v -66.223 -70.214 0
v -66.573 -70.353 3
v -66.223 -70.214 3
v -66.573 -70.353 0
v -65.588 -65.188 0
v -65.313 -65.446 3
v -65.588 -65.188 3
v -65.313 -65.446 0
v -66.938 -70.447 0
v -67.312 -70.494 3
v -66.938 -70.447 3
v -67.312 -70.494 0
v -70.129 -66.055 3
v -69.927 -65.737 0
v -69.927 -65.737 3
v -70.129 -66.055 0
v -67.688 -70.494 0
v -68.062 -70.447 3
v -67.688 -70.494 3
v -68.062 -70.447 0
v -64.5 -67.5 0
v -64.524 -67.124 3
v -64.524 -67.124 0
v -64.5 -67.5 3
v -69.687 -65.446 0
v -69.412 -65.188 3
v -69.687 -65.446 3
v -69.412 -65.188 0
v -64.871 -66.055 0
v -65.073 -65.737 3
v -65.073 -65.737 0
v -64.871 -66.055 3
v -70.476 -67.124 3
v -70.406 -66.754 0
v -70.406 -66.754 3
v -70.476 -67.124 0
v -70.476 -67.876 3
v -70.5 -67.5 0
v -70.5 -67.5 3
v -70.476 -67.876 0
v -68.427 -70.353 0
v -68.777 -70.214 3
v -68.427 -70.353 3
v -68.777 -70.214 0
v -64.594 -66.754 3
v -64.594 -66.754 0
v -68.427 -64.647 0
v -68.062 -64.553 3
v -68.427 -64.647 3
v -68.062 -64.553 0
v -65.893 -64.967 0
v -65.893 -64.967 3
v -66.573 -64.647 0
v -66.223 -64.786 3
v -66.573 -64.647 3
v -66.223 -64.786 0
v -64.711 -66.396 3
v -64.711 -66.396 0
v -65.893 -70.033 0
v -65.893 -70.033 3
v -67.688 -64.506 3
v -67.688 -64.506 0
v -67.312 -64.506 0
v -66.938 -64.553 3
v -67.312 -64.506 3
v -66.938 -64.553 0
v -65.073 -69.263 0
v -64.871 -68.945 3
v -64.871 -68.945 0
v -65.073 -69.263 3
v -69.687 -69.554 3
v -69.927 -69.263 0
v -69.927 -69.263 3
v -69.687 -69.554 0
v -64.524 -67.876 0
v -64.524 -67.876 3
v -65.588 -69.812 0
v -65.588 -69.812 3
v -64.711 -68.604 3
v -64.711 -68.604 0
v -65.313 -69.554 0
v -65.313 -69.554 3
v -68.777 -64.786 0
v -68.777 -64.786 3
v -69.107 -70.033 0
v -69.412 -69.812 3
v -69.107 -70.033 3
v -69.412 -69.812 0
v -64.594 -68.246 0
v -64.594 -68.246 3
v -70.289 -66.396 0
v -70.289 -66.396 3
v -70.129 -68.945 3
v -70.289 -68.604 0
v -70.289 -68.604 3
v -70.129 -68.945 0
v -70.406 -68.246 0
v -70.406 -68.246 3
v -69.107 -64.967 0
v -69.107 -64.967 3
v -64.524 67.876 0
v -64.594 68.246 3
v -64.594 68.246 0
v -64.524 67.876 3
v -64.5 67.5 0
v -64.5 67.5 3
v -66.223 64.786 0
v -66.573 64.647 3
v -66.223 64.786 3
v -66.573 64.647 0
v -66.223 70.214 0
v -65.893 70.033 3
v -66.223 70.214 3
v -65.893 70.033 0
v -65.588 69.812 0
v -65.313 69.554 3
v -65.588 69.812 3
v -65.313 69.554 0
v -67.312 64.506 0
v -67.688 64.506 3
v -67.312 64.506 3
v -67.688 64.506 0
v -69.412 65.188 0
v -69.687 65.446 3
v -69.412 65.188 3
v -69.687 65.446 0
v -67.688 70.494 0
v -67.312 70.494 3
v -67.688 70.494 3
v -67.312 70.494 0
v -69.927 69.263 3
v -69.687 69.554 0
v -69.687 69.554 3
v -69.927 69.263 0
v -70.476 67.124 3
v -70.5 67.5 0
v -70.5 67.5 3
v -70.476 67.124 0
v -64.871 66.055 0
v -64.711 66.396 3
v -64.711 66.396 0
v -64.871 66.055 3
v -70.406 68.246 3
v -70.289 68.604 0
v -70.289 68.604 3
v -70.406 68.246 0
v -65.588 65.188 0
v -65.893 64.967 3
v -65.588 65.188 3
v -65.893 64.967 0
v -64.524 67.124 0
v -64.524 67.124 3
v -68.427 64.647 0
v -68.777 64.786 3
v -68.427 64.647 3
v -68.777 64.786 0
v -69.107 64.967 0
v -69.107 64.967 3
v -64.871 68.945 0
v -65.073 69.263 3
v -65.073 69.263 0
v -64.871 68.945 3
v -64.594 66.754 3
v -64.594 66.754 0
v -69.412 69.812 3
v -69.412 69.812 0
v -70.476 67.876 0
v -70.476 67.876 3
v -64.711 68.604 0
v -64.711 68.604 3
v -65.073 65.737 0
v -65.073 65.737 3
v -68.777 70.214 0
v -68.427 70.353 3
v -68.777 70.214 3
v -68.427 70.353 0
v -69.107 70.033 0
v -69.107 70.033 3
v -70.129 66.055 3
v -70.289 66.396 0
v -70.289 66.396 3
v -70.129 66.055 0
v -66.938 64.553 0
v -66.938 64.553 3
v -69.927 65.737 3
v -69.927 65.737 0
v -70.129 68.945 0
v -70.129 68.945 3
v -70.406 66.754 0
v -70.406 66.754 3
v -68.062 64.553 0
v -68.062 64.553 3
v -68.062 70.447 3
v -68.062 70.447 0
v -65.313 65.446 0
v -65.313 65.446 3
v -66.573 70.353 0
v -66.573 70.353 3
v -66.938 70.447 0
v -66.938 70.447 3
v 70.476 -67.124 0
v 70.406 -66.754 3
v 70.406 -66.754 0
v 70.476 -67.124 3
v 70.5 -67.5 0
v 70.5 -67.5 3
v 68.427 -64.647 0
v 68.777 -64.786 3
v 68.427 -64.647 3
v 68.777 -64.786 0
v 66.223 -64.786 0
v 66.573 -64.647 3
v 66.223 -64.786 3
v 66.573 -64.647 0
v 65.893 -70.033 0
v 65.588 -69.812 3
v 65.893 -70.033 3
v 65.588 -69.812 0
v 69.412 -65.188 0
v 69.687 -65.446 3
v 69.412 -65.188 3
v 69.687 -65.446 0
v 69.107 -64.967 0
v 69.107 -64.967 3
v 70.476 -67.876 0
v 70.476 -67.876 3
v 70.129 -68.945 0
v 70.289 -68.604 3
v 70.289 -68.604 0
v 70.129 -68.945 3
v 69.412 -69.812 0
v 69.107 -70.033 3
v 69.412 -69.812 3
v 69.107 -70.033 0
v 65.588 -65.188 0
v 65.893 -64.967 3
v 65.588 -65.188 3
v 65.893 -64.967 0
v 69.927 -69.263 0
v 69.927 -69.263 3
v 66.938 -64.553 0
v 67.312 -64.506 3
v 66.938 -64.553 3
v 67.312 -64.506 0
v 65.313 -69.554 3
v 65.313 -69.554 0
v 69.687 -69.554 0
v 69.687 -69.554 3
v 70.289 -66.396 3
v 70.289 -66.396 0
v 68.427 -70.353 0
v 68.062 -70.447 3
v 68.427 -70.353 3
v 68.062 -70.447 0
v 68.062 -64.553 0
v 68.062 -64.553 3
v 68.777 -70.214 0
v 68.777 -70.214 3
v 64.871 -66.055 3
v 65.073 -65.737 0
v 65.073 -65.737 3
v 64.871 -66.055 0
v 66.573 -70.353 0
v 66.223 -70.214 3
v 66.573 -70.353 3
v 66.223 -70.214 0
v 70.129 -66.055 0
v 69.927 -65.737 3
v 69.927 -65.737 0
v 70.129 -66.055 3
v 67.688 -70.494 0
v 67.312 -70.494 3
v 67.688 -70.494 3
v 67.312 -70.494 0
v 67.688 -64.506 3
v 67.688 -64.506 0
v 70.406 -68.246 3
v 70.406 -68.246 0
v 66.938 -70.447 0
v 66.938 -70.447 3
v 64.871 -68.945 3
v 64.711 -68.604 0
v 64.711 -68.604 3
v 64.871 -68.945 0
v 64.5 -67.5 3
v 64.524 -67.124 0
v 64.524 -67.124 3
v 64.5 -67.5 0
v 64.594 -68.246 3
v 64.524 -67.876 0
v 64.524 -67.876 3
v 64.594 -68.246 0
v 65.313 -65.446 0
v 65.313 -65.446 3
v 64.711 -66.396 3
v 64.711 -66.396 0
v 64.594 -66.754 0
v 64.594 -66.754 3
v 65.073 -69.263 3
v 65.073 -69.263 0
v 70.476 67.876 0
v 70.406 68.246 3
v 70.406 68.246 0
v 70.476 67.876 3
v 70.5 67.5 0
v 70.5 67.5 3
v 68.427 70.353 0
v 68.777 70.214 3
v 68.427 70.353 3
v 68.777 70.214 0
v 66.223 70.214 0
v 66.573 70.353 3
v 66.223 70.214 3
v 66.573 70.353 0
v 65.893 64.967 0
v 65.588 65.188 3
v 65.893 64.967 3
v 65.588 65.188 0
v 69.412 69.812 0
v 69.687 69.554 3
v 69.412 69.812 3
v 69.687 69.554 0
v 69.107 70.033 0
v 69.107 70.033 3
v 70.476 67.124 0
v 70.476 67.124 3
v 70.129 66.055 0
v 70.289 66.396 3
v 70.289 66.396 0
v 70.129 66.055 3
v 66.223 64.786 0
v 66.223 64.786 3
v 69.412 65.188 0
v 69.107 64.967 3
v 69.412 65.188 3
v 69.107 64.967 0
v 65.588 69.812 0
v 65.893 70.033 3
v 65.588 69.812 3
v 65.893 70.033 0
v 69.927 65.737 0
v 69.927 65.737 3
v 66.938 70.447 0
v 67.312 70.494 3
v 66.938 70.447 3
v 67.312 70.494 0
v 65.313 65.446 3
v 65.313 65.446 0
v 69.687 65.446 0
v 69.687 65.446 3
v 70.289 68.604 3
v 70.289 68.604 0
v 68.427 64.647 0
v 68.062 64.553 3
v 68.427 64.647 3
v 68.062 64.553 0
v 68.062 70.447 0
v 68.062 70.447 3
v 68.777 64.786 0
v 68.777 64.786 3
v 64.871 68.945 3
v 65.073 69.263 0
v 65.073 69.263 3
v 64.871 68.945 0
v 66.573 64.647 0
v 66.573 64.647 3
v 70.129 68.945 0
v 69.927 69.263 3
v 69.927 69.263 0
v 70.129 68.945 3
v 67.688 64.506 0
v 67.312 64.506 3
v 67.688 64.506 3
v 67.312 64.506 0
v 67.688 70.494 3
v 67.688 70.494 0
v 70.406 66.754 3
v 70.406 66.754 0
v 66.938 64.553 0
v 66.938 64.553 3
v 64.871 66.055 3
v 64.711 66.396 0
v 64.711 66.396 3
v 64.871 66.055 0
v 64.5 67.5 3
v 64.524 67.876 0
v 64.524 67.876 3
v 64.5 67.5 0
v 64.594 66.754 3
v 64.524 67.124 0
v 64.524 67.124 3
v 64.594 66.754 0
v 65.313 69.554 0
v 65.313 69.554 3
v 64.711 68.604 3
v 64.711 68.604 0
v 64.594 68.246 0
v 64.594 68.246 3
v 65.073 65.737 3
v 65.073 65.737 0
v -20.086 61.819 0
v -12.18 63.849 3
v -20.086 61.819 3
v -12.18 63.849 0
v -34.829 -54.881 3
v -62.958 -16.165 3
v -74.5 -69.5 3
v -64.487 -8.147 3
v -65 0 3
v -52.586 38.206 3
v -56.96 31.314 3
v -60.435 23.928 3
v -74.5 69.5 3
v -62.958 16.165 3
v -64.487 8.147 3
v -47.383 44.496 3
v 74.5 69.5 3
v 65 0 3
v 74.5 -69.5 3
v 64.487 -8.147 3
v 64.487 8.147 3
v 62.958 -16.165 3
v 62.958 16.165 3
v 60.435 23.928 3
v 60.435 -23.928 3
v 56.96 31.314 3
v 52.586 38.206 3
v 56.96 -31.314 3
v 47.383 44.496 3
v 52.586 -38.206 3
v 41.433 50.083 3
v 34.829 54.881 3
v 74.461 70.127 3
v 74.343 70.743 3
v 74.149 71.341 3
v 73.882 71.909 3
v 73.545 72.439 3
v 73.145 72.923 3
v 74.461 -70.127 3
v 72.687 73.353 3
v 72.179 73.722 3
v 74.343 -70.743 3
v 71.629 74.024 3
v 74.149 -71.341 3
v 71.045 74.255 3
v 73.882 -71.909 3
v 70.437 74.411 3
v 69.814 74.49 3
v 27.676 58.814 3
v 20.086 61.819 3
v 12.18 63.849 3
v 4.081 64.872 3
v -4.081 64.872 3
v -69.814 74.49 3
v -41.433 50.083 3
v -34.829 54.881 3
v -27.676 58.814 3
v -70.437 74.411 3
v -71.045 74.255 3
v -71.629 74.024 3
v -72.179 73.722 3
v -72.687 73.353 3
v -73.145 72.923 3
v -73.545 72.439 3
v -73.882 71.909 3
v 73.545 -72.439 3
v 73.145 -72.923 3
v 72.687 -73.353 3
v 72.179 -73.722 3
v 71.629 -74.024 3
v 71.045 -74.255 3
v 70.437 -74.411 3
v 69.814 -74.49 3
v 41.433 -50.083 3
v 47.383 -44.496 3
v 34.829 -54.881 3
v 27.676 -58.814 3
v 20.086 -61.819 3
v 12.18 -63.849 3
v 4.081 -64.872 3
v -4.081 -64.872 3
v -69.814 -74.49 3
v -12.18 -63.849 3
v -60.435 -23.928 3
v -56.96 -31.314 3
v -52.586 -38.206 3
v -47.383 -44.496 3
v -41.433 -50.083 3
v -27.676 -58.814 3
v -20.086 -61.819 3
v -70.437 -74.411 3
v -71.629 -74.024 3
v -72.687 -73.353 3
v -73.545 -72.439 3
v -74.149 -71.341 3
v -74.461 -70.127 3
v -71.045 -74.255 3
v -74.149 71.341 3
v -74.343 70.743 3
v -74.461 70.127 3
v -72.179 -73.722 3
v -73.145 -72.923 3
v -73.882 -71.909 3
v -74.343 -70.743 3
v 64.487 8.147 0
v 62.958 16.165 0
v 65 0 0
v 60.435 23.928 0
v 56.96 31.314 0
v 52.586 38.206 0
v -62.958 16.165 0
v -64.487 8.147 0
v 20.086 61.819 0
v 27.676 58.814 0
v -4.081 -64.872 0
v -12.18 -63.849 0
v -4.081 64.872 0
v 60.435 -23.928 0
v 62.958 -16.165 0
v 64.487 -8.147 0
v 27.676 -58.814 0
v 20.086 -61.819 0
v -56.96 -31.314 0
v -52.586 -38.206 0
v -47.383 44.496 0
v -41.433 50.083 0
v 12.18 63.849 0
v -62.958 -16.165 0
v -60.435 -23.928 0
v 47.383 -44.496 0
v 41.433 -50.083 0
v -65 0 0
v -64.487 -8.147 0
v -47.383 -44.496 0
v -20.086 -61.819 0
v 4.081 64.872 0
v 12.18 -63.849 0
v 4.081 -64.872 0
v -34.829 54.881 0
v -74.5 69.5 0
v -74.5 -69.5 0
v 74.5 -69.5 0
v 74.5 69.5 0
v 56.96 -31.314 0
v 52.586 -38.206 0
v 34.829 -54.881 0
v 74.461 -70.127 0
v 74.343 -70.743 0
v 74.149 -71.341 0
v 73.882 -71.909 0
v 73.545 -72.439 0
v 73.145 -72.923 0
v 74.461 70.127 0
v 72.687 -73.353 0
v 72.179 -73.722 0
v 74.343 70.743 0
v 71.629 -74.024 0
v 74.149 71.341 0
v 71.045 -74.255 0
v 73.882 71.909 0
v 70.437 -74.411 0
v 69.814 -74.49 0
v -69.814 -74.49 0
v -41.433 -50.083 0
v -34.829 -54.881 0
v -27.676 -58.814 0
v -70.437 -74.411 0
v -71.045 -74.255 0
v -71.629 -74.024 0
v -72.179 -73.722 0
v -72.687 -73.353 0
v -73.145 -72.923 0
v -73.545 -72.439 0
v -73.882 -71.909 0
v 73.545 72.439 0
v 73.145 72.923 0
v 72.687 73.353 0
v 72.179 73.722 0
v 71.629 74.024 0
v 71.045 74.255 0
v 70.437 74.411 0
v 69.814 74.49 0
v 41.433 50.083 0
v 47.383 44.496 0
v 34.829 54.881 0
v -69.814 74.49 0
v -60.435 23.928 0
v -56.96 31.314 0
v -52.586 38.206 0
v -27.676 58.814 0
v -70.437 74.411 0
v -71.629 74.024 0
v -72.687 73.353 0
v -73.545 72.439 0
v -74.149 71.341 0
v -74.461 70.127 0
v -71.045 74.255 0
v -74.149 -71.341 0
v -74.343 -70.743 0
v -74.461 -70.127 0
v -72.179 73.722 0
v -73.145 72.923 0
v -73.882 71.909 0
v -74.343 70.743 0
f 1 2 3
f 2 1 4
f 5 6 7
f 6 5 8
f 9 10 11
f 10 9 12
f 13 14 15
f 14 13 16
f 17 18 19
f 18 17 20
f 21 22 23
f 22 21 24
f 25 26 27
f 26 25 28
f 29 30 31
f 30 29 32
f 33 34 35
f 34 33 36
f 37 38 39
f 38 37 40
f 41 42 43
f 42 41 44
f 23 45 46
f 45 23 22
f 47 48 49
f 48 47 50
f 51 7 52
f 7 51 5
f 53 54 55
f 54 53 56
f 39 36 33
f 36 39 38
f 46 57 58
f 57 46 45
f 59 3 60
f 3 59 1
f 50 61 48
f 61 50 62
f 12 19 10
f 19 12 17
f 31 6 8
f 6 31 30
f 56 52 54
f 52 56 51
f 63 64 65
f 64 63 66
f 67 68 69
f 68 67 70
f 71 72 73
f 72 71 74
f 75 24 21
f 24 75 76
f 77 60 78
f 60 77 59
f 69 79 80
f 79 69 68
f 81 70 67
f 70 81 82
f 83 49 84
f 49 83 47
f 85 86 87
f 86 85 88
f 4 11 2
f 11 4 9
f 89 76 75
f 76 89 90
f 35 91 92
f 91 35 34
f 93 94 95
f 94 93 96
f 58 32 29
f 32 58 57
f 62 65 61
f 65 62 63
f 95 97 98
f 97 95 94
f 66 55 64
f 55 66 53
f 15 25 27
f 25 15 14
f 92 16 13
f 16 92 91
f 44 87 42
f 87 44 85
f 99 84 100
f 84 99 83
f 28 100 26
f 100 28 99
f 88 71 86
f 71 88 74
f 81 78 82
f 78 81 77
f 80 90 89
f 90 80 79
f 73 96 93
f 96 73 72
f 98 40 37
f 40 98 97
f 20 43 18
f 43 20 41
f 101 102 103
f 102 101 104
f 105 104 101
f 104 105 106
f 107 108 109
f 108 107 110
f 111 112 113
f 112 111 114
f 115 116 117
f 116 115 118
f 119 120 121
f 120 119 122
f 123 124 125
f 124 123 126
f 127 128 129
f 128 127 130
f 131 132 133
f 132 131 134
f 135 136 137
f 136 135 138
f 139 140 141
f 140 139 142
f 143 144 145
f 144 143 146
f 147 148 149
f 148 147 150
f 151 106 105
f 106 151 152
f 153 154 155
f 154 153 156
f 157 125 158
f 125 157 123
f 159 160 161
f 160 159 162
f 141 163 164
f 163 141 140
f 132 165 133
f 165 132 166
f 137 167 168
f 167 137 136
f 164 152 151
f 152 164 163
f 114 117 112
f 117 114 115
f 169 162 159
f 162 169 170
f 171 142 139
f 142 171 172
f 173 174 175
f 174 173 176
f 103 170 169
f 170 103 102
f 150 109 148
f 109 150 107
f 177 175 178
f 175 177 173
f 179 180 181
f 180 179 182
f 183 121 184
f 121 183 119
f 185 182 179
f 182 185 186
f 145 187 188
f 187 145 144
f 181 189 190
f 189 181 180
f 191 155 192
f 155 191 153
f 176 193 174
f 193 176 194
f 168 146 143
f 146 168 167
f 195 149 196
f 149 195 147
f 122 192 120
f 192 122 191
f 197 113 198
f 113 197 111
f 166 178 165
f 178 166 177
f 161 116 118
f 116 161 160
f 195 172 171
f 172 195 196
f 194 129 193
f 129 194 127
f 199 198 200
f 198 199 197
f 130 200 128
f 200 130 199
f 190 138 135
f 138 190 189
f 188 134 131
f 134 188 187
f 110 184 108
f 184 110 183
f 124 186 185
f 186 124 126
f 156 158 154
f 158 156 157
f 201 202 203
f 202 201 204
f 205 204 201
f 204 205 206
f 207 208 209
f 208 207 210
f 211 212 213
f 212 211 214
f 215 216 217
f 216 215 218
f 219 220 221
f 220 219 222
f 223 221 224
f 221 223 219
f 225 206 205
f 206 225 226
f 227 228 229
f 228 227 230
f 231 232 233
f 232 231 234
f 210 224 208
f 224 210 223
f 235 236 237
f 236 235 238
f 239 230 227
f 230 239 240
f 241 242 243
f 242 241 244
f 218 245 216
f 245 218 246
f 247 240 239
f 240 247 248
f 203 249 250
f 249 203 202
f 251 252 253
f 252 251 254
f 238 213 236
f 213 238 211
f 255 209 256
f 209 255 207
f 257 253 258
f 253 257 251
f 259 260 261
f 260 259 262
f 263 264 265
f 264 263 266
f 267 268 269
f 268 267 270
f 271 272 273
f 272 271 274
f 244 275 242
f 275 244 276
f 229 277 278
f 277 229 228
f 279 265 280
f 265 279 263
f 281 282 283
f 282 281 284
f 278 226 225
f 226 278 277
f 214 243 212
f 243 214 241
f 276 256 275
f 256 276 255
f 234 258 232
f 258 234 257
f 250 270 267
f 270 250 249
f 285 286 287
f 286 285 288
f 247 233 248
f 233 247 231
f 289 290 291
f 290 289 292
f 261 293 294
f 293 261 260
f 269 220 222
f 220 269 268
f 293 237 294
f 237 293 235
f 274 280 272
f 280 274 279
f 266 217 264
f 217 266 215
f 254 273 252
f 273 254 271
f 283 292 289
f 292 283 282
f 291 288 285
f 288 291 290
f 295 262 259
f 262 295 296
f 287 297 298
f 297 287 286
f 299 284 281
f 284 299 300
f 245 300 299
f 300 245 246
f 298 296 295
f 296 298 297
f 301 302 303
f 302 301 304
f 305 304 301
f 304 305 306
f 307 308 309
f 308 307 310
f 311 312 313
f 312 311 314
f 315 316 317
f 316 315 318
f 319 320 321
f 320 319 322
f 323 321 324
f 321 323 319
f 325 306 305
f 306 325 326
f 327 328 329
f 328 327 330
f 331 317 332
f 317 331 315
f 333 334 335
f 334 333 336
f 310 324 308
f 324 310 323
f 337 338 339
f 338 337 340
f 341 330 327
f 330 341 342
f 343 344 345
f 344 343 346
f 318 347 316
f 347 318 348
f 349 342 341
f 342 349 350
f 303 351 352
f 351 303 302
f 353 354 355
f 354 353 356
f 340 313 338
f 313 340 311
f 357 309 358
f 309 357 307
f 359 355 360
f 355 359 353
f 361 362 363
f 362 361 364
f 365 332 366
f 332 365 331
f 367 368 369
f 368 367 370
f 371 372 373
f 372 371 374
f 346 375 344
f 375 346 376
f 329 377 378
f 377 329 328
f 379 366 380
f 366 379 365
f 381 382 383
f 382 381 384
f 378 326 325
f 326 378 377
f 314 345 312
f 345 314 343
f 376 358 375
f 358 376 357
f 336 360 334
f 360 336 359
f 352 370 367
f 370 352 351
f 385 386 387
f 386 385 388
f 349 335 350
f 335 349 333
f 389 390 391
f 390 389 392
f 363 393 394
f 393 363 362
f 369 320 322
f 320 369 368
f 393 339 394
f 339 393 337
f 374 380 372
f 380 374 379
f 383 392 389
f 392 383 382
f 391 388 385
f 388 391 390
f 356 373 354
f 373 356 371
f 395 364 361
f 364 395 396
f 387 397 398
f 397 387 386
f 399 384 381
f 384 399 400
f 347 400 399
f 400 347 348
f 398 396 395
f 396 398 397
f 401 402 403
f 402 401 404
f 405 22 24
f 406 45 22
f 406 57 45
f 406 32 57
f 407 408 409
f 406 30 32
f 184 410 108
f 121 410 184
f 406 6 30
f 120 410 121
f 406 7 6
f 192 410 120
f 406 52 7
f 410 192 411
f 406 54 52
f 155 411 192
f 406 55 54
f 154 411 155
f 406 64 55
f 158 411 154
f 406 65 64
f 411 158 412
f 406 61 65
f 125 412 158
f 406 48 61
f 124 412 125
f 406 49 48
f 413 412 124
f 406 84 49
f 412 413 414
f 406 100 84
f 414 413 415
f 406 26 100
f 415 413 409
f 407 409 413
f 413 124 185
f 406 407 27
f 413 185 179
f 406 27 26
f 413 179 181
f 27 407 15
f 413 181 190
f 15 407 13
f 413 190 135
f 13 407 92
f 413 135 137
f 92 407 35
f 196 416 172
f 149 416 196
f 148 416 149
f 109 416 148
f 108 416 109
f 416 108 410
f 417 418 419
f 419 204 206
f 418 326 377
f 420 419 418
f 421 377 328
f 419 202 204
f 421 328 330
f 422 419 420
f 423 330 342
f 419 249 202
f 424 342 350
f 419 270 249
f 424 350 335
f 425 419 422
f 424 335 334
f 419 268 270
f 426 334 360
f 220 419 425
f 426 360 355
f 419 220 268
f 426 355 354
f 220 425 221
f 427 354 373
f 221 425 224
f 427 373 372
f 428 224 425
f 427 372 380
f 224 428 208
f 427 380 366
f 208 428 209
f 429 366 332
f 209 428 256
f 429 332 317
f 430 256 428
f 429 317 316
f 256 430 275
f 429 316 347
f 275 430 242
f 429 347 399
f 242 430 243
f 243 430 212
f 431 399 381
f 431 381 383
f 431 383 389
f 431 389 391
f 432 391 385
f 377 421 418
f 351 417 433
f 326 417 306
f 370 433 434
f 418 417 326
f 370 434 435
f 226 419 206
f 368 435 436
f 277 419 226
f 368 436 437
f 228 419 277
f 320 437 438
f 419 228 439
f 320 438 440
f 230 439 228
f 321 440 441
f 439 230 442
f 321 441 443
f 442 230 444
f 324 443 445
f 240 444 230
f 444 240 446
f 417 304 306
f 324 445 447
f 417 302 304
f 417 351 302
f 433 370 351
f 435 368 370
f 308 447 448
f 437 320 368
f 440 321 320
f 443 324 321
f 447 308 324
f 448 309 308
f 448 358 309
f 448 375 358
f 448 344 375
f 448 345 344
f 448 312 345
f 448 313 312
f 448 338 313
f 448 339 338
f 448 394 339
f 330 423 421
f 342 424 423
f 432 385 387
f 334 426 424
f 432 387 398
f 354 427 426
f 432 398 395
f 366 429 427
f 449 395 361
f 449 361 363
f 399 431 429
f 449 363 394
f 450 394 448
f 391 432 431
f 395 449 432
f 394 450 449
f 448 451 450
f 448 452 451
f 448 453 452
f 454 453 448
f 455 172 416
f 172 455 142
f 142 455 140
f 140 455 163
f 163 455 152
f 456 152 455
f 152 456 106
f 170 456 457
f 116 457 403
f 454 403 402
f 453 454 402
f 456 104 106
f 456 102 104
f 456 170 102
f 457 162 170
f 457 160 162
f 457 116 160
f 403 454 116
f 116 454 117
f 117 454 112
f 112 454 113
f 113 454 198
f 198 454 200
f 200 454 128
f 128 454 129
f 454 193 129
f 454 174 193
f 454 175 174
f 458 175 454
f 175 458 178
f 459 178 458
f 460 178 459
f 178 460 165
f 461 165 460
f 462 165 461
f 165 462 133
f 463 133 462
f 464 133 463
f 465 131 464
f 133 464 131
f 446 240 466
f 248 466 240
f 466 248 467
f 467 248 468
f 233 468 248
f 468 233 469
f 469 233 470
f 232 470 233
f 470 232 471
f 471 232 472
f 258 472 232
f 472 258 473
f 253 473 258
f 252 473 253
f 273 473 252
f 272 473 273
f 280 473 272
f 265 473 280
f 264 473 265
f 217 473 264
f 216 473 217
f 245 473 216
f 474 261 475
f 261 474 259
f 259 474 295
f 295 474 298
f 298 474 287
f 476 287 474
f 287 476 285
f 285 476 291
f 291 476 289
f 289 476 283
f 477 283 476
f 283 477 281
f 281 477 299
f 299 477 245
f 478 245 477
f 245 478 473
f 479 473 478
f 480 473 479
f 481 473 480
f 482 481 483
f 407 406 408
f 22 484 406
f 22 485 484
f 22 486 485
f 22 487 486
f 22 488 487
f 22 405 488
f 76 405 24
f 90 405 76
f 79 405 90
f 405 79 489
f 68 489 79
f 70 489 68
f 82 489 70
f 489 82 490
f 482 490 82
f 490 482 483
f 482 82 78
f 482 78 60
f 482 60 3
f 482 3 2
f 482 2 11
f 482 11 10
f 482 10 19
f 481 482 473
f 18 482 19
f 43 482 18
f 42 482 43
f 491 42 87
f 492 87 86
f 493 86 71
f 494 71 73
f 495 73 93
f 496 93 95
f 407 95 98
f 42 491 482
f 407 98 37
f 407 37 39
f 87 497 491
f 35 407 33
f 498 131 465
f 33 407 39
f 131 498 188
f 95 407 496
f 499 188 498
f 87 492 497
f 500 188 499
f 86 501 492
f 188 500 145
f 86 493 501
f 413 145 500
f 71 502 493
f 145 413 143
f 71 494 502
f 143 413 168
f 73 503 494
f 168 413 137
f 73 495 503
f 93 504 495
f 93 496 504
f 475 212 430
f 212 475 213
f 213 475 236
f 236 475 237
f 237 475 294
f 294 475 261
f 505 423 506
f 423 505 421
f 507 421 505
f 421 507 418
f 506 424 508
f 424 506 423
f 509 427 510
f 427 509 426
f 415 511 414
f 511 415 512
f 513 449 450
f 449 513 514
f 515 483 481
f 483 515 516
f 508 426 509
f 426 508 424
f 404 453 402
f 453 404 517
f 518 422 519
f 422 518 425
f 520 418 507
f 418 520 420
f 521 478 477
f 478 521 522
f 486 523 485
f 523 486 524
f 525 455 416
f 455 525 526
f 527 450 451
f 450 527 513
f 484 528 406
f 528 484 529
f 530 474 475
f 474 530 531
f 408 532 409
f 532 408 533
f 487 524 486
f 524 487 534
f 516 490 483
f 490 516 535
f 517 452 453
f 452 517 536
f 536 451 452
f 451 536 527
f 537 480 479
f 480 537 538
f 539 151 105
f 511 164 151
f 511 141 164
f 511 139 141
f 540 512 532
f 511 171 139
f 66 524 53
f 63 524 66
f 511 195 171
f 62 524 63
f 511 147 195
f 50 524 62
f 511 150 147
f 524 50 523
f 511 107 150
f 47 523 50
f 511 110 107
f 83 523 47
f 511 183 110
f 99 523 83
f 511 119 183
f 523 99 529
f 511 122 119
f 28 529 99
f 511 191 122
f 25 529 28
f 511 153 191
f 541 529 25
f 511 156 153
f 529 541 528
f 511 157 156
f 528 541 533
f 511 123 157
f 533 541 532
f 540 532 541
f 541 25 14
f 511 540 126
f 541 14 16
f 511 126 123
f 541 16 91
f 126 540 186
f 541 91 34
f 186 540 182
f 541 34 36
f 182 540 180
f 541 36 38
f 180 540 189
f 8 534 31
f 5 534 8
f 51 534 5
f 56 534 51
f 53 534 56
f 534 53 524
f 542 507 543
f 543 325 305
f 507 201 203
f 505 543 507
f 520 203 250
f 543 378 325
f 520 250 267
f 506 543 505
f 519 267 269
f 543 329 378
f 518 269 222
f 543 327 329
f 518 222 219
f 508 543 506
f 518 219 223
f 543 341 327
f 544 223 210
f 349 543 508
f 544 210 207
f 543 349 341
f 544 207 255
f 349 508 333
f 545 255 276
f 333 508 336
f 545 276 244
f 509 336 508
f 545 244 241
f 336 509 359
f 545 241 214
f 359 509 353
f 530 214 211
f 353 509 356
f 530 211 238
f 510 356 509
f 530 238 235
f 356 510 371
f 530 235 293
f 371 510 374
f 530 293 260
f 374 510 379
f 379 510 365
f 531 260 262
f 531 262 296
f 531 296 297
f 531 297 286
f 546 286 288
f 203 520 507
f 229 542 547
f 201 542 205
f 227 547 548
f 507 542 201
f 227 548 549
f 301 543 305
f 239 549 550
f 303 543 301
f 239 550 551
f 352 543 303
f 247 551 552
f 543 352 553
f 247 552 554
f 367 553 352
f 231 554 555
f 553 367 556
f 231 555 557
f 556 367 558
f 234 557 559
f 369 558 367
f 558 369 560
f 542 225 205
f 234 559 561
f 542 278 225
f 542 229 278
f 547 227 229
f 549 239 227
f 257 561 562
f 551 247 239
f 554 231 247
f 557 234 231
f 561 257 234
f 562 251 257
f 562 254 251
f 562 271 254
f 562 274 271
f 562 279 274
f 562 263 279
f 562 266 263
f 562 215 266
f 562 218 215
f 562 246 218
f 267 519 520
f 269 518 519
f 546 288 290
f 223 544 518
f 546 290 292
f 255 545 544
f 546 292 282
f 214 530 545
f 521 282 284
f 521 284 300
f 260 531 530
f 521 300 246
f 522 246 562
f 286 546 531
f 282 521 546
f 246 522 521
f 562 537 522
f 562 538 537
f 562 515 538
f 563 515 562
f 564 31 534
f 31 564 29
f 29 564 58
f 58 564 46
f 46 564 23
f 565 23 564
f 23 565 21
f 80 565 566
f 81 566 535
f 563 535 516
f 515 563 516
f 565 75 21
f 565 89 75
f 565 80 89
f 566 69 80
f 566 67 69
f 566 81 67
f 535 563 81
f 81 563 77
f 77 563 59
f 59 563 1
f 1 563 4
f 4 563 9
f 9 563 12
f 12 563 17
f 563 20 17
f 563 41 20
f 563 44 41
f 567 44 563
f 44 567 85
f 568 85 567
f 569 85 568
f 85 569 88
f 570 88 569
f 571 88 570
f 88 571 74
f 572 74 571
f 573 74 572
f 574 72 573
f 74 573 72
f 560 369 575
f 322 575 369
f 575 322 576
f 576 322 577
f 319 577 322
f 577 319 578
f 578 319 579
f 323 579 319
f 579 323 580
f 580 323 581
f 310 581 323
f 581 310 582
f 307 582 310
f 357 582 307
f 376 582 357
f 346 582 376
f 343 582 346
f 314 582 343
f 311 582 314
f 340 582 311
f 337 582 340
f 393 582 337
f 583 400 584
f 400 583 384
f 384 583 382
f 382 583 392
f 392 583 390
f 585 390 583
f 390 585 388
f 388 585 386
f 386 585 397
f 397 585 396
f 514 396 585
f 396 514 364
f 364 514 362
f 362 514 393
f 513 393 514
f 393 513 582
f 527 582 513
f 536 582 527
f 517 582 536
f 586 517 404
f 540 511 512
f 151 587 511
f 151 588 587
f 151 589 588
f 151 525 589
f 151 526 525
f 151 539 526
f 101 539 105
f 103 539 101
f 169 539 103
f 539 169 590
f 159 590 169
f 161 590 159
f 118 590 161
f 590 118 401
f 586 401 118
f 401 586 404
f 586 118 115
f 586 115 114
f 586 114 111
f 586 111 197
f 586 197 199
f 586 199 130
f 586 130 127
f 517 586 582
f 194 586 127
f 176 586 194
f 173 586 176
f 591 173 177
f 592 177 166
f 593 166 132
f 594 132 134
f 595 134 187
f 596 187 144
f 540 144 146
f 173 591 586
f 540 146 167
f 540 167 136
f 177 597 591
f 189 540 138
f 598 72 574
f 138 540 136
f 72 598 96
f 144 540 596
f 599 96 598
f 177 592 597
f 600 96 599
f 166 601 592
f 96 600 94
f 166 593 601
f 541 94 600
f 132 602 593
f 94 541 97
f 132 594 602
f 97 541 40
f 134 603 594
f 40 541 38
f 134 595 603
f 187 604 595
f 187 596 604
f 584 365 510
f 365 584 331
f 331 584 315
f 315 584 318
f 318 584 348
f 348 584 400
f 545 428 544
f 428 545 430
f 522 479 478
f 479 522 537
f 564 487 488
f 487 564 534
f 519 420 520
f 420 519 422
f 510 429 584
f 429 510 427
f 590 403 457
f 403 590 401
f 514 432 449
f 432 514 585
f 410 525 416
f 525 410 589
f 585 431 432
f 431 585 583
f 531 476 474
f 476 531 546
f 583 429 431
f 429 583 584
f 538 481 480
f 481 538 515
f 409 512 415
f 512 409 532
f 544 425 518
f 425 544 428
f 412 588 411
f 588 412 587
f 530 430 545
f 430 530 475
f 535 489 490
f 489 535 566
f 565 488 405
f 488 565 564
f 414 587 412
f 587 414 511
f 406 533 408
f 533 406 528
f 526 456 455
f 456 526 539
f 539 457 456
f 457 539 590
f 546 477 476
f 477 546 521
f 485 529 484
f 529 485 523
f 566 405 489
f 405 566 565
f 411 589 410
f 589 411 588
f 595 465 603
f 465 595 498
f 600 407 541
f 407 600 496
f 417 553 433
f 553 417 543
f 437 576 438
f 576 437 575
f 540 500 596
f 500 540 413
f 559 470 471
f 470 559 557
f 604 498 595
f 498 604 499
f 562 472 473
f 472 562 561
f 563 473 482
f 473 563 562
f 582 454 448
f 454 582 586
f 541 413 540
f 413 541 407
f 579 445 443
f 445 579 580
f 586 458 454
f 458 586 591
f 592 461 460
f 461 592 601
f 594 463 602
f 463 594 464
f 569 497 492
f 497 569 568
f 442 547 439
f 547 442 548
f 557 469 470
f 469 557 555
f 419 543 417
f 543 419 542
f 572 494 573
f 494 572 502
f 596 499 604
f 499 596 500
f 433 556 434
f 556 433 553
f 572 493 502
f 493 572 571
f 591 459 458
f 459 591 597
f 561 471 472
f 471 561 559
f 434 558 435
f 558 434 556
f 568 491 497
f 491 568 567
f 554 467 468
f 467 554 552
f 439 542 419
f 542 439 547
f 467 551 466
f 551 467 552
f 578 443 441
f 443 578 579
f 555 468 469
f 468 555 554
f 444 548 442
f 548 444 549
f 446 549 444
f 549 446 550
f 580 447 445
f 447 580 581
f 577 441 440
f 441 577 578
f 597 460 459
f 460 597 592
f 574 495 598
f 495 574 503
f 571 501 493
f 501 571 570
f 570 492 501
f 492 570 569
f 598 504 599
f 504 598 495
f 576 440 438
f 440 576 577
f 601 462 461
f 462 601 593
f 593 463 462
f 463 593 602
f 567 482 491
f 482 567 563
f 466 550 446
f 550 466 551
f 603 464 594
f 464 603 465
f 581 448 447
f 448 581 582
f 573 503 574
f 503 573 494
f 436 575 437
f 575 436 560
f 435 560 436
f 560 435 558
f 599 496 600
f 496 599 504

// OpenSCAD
$fn = 50;


difference() {
	union() {
		hull() {
			translate(v = [-69.5000000000, 69.5000000000, 0]) {
				cylinder(h = 3, r = 5);
			}
			translate(v = [69.5000000000, 69.5000000000, 0]) {
				cylinder(h = 3, r = 5);
			}
			translate(v = [-69.5000000000, -69.5000000000, 0]) {
				cylinder(h = 3, r = 5);
			}
			translate(v = [69.5000000000, -69.5000000000, 0]) {
				cylinder(h = 3, r = 5);
			}
		}
	}
	union() {
		#translate(v = [-67.5000000000, -67.5000000000, -100.0000000000]) {
			cylinder(h = 200, r = 3.0000000000);
		}
		#translate(v = [-67.5000000000, 67.5000000000, -100.0000000000]) {
			cylinder(h = 200, r = 3.0000000000);
		}
		#translate(v = [67.5000000000, -67.5000000000, -100.0000000000]) {
			cylinder(h = 200, r = 3.0000000000);
		}
		#translate(v = [67.5000000000, 67.5000000000, -100.0000000000]) {
			cylinder(h = 200, r = 3.0000000000);
		}
		#cylinder(h = 3, r = 65.0000000000);
	}
}
